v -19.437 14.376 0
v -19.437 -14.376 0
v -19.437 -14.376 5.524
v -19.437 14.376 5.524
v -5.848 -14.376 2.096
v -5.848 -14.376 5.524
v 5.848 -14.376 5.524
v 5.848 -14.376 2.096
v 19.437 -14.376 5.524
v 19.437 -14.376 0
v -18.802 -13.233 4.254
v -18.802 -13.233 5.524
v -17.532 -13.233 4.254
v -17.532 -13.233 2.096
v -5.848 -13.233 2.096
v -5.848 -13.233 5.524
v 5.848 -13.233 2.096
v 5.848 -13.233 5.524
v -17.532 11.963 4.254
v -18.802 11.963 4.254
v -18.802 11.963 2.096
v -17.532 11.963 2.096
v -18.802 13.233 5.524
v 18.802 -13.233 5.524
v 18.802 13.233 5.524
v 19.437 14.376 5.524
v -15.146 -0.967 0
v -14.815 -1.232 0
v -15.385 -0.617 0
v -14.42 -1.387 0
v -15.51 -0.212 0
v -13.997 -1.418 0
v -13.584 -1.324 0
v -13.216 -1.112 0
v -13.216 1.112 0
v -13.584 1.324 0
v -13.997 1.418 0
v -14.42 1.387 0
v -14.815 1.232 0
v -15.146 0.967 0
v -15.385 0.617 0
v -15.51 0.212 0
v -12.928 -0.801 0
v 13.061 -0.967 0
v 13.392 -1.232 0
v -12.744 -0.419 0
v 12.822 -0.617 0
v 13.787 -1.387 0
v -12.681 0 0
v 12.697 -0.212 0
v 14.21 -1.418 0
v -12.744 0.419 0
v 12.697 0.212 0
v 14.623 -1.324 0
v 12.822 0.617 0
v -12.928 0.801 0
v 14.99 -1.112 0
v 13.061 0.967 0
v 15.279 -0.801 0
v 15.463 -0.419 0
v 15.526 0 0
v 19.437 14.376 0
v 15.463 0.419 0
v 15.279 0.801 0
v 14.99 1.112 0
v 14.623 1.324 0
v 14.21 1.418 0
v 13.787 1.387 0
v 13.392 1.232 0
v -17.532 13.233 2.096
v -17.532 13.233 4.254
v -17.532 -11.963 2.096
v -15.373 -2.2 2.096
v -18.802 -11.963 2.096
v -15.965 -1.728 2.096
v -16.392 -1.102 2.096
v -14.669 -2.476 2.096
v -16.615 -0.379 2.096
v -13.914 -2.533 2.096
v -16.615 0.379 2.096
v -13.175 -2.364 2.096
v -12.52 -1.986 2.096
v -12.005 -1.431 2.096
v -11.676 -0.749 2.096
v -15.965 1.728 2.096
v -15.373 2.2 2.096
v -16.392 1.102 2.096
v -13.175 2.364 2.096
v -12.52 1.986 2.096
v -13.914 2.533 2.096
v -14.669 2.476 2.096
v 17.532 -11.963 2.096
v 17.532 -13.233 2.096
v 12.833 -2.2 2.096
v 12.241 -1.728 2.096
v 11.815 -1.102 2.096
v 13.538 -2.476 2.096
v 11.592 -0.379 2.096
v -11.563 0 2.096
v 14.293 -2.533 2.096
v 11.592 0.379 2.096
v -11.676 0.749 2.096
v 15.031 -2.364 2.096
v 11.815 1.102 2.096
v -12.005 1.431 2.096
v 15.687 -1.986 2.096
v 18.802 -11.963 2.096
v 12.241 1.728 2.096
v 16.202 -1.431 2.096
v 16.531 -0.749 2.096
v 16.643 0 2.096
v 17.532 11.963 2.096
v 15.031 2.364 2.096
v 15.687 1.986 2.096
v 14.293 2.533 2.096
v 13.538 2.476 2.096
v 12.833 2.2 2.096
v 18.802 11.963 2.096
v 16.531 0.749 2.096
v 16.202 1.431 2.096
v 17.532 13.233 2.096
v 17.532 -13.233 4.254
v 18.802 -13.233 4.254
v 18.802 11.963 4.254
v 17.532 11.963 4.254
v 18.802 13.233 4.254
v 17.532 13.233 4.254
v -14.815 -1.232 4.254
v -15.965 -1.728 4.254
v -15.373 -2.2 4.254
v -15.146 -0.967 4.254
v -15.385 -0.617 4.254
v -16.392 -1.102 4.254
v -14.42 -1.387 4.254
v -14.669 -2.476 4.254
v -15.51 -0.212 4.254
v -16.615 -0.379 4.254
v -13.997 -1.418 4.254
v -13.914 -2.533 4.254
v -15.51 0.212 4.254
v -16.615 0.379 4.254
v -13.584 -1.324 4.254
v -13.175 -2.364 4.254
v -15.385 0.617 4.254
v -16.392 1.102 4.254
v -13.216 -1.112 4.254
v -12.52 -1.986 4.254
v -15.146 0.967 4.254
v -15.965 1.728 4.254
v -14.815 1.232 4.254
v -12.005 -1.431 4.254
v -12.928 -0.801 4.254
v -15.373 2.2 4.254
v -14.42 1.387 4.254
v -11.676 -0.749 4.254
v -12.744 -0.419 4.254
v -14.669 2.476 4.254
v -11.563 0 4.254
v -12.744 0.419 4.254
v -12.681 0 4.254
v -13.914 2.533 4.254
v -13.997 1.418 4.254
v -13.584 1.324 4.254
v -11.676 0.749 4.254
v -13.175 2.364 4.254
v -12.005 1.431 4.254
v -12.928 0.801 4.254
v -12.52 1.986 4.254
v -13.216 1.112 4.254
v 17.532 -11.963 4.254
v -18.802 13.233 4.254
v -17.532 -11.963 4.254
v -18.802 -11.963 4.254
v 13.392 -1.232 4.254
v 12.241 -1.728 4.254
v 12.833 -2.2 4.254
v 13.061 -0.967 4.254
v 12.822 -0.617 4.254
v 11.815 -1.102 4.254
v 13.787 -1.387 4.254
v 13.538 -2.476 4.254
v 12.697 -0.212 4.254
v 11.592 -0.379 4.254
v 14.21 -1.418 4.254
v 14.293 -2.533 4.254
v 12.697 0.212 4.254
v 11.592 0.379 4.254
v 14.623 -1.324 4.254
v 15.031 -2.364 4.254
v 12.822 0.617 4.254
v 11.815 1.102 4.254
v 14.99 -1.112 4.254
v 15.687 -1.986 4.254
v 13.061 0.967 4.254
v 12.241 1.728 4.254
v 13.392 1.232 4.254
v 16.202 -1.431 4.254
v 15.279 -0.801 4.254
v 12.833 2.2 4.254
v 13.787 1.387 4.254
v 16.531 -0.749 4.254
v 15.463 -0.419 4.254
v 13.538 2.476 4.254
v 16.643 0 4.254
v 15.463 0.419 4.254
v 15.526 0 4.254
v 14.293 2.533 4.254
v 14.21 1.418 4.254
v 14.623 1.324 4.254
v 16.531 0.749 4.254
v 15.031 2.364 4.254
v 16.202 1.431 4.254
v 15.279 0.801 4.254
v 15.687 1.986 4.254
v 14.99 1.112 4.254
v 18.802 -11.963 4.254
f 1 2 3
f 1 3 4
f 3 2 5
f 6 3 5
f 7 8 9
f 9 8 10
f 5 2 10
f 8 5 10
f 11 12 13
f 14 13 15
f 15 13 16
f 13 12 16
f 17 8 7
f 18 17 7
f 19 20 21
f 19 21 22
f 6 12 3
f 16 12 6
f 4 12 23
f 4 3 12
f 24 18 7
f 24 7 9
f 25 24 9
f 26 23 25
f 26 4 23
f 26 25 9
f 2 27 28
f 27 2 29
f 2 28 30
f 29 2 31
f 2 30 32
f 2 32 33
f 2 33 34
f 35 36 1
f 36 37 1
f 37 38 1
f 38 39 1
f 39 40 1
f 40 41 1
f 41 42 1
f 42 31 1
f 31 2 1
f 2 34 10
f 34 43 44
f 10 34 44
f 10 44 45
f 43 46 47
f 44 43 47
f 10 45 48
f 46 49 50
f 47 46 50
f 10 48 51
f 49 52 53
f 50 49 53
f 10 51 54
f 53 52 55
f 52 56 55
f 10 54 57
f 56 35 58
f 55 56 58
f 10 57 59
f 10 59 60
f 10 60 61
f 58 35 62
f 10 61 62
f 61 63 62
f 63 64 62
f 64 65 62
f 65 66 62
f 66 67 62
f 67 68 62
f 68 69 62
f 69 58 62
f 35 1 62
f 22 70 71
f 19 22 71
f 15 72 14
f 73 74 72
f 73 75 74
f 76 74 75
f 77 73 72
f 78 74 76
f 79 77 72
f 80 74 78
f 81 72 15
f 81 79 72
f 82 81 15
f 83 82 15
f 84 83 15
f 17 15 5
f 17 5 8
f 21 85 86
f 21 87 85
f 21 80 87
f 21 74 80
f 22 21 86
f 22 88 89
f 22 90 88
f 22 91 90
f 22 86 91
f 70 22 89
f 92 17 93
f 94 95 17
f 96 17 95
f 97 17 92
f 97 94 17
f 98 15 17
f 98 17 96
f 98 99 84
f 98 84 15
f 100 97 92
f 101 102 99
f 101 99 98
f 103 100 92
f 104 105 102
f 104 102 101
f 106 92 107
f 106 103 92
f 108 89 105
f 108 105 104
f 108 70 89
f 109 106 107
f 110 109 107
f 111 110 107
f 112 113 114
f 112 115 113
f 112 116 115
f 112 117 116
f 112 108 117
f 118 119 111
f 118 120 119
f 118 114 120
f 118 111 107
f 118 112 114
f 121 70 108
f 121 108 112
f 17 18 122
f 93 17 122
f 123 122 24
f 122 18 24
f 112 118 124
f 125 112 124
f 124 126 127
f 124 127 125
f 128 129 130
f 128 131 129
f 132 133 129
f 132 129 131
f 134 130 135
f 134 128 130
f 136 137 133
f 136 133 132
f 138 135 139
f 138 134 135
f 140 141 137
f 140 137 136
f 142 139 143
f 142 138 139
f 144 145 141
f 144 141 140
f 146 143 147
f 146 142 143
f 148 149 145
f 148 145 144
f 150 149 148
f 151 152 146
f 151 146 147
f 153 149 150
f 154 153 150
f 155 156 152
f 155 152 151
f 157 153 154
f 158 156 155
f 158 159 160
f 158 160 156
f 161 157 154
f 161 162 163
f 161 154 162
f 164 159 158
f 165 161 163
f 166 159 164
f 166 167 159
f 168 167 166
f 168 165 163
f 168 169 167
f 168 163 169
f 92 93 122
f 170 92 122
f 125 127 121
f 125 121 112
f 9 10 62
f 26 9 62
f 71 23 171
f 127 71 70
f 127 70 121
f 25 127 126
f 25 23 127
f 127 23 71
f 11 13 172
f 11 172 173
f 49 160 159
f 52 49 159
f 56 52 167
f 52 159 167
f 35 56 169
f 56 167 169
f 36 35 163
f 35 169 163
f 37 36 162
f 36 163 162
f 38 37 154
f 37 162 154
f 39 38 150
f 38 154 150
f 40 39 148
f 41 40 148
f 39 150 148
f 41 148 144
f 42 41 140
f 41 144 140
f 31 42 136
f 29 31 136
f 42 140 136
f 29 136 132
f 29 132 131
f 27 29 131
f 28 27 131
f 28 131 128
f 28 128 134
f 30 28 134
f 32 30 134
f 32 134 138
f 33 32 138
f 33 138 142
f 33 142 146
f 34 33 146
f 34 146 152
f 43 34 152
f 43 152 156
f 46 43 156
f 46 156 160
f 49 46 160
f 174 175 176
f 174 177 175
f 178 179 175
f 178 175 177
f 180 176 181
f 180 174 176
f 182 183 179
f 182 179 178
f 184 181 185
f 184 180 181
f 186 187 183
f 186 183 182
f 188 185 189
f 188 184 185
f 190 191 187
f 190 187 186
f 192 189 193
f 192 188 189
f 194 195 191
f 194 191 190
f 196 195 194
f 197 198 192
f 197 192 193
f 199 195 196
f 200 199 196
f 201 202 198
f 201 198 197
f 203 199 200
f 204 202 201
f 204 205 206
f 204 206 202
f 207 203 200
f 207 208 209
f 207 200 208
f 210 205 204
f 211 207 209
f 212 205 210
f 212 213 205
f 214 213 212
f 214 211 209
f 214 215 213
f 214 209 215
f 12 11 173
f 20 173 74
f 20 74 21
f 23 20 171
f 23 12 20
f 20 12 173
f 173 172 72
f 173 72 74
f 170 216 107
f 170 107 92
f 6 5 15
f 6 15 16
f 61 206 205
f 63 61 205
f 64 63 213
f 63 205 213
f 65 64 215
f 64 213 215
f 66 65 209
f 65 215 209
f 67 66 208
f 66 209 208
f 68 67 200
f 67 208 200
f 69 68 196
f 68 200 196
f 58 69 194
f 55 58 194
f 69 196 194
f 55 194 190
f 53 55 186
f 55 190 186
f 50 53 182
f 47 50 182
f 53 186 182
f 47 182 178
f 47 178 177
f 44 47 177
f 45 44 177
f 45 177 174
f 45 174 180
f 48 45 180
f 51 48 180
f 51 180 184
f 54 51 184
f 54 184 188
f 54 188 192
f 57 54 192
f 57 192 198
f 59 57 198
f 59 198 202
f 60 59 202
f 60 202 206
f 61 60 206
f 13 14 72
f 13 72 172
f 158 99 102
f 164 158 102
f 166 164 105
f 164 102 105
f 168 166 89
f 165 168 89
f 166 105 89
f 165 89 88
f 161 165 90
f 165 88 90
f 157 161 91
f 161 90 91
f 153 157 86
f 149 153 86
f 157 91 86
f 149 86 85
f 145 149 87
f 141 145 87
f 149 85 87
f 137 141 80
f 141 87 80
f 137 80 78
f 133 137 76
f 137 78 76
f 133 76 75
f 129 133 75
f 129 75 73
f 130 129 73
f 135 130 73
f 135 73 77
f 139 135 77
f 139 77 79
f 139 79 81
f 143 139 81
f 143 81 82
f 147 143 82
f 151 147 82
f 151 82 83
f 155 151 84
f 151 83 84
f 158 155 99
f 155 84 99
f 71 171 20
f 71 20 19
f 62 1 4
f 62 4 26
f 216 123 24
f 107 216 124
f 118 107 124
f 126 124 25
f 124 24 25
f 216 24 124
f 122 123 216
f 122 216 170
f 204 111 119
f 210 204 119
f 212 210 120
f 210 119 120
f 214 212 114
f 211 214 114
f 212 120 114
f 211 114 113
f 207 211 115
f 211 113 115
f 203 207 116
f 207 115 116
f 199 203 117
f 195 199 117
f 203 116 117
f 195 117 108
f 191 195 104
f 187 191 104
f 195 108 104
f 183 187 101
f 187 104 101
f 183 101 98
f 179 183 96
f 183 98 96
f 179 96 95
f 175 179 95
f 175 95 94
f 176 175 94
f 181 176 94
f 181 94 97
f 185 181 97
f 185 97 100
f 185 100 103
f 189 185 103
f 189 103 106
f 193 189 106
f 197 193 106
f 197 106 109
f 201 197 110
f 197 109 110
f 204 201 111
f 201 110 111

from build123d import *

# Parameters (mm, degrees)
F0_W      = 38.8747
F0_H      = 28.7528
F1_DEPTH  = 5.5245
F2_W      = 37.6047
F2_H      = 26.4668
F3_DEPTH  = 3.429
F4_W      = 1.27
F4_H      = 2.159
F5_DEPTH  = 1.27
F6_W      = 1.27
F6_H      = 2.159
F7_DEPTH  = 1.27
F8_W      = 1.27
F8_H      = 2.159
F9_DEPTH  = 1.27
F10_W     = 1.27
F10_H     = 2.159
F11_DEPTH = 1.27
F12_R     = 2.54
F13_DEPTH = 2.159
F14_R     = 1.4224
F15_DEPTH = 4.2555
F16_R     = 2.54
F17_DEPTH = 2.159
F18_R     = 1.4224
F19_DEPTH = 4.2555
F20_W     = 11.6967
F20_H     = 3.429
F21_DEPTH = 2.032


with BuildPart() as f1:
    # F0 (on Top) → F1 (new body)
    with BuildSketch(Plane.XY):
        Rectangle(F0_W, F0_H)
    extrude(amount=F1_DEPTH)

    # F2 (on face) → F3 (cut)
    with BuildSketch(Plane.XY.offset(5.5245)):
        Rectangle(F2_W, F2_H)
    extrude(amount=-F3_DEPTH, mode=Mode.SUBTRACT)

    # F4 (on face) → F5 (join)
    with BuildSketch(Plane.XZ.offset(-13.2334)):
        with Locations((-18.16735, 3.175)):
            Rectangle(F4_W, F4_H)
    extrude(amount=F5_DEPTH)

    # F6 (on face) → F7 (join)
    with BuildSketch(Plane(origin=(18.80235, 0, 0), x_dir=(0, -1, 0), z_dir=(-1, 0, 0))):
        with Locations((-12.5984, 3.175)):
            Rectangle(F6_W, F6_H)
    extrude(amount=F7_DEPTH)

    # F8 (on face) → F9 (join)
    with BuildSketch(Plane(origin=(0, -13.2334, 0), x_dir=(-1, 0, 0), z_dir=(0, 1, 0))):
        with Locations((-18.16735, 3.175)):
            Rectangle(F8_W, F8_H)
    extrude(amount=F9_DEPTH)

    # F10 (on face) → F11 (join)
    with BuildSketch(Plane(origin=(0, -13.2334, 0), x_dir=(-1, 0, 0), z_dir=(0, 1, 0))):
        with Locations((18.16735, 3.175)):
            Rectangle(F10_W, F10_H)
    extrude(amount=F11_DEPTH)

    # F12 (on face) → F13 (join)
    with BuildSketch(Plane.XY.offset(2.0955)):
        with Locations((-14.10335, 0)):
            Circle(F12_R)
    extrude(amount=F13_DEPTH)

    # F14 (on face) → F15 (cut, through all)
    with BuildSketch(Plane.XY.offset(4.2545)):
        with Locations((-14.10335, 0)):
            Circle(F14_R)
    extrude(amount=-F15_DEPTH, mode=Mode.SUBTRACT)

    # F16 (on face) → F17 (join)
    with BuildSketch(Plane.XY.offset(2.0955)):
        with Locations((14.10335, 0)):
            Circle(F16_R)
    extrude(amount=F17_DEPTH)

    # F18 (on face) → F19 (cut, through all)
    with BuildSketch(Plane.XY.offset(4.2545)):
        with Locations((14.10335, 0)):
            Circle(F18_R)
    extrude(amount=-F19_DEPTH, mode=Mode.SUBTRACT)

    # F20 (on face) → F21 (cut)
    with BuildSketch(Plane.XZ.offset(14.3764)):
        with Locations((0, 3.81)):
            Rectangle(F20_W, F20_H)
    extrude(amount=-F21_DEPTH, mode=Mode.SUBTRACT)


solid = f1.part
